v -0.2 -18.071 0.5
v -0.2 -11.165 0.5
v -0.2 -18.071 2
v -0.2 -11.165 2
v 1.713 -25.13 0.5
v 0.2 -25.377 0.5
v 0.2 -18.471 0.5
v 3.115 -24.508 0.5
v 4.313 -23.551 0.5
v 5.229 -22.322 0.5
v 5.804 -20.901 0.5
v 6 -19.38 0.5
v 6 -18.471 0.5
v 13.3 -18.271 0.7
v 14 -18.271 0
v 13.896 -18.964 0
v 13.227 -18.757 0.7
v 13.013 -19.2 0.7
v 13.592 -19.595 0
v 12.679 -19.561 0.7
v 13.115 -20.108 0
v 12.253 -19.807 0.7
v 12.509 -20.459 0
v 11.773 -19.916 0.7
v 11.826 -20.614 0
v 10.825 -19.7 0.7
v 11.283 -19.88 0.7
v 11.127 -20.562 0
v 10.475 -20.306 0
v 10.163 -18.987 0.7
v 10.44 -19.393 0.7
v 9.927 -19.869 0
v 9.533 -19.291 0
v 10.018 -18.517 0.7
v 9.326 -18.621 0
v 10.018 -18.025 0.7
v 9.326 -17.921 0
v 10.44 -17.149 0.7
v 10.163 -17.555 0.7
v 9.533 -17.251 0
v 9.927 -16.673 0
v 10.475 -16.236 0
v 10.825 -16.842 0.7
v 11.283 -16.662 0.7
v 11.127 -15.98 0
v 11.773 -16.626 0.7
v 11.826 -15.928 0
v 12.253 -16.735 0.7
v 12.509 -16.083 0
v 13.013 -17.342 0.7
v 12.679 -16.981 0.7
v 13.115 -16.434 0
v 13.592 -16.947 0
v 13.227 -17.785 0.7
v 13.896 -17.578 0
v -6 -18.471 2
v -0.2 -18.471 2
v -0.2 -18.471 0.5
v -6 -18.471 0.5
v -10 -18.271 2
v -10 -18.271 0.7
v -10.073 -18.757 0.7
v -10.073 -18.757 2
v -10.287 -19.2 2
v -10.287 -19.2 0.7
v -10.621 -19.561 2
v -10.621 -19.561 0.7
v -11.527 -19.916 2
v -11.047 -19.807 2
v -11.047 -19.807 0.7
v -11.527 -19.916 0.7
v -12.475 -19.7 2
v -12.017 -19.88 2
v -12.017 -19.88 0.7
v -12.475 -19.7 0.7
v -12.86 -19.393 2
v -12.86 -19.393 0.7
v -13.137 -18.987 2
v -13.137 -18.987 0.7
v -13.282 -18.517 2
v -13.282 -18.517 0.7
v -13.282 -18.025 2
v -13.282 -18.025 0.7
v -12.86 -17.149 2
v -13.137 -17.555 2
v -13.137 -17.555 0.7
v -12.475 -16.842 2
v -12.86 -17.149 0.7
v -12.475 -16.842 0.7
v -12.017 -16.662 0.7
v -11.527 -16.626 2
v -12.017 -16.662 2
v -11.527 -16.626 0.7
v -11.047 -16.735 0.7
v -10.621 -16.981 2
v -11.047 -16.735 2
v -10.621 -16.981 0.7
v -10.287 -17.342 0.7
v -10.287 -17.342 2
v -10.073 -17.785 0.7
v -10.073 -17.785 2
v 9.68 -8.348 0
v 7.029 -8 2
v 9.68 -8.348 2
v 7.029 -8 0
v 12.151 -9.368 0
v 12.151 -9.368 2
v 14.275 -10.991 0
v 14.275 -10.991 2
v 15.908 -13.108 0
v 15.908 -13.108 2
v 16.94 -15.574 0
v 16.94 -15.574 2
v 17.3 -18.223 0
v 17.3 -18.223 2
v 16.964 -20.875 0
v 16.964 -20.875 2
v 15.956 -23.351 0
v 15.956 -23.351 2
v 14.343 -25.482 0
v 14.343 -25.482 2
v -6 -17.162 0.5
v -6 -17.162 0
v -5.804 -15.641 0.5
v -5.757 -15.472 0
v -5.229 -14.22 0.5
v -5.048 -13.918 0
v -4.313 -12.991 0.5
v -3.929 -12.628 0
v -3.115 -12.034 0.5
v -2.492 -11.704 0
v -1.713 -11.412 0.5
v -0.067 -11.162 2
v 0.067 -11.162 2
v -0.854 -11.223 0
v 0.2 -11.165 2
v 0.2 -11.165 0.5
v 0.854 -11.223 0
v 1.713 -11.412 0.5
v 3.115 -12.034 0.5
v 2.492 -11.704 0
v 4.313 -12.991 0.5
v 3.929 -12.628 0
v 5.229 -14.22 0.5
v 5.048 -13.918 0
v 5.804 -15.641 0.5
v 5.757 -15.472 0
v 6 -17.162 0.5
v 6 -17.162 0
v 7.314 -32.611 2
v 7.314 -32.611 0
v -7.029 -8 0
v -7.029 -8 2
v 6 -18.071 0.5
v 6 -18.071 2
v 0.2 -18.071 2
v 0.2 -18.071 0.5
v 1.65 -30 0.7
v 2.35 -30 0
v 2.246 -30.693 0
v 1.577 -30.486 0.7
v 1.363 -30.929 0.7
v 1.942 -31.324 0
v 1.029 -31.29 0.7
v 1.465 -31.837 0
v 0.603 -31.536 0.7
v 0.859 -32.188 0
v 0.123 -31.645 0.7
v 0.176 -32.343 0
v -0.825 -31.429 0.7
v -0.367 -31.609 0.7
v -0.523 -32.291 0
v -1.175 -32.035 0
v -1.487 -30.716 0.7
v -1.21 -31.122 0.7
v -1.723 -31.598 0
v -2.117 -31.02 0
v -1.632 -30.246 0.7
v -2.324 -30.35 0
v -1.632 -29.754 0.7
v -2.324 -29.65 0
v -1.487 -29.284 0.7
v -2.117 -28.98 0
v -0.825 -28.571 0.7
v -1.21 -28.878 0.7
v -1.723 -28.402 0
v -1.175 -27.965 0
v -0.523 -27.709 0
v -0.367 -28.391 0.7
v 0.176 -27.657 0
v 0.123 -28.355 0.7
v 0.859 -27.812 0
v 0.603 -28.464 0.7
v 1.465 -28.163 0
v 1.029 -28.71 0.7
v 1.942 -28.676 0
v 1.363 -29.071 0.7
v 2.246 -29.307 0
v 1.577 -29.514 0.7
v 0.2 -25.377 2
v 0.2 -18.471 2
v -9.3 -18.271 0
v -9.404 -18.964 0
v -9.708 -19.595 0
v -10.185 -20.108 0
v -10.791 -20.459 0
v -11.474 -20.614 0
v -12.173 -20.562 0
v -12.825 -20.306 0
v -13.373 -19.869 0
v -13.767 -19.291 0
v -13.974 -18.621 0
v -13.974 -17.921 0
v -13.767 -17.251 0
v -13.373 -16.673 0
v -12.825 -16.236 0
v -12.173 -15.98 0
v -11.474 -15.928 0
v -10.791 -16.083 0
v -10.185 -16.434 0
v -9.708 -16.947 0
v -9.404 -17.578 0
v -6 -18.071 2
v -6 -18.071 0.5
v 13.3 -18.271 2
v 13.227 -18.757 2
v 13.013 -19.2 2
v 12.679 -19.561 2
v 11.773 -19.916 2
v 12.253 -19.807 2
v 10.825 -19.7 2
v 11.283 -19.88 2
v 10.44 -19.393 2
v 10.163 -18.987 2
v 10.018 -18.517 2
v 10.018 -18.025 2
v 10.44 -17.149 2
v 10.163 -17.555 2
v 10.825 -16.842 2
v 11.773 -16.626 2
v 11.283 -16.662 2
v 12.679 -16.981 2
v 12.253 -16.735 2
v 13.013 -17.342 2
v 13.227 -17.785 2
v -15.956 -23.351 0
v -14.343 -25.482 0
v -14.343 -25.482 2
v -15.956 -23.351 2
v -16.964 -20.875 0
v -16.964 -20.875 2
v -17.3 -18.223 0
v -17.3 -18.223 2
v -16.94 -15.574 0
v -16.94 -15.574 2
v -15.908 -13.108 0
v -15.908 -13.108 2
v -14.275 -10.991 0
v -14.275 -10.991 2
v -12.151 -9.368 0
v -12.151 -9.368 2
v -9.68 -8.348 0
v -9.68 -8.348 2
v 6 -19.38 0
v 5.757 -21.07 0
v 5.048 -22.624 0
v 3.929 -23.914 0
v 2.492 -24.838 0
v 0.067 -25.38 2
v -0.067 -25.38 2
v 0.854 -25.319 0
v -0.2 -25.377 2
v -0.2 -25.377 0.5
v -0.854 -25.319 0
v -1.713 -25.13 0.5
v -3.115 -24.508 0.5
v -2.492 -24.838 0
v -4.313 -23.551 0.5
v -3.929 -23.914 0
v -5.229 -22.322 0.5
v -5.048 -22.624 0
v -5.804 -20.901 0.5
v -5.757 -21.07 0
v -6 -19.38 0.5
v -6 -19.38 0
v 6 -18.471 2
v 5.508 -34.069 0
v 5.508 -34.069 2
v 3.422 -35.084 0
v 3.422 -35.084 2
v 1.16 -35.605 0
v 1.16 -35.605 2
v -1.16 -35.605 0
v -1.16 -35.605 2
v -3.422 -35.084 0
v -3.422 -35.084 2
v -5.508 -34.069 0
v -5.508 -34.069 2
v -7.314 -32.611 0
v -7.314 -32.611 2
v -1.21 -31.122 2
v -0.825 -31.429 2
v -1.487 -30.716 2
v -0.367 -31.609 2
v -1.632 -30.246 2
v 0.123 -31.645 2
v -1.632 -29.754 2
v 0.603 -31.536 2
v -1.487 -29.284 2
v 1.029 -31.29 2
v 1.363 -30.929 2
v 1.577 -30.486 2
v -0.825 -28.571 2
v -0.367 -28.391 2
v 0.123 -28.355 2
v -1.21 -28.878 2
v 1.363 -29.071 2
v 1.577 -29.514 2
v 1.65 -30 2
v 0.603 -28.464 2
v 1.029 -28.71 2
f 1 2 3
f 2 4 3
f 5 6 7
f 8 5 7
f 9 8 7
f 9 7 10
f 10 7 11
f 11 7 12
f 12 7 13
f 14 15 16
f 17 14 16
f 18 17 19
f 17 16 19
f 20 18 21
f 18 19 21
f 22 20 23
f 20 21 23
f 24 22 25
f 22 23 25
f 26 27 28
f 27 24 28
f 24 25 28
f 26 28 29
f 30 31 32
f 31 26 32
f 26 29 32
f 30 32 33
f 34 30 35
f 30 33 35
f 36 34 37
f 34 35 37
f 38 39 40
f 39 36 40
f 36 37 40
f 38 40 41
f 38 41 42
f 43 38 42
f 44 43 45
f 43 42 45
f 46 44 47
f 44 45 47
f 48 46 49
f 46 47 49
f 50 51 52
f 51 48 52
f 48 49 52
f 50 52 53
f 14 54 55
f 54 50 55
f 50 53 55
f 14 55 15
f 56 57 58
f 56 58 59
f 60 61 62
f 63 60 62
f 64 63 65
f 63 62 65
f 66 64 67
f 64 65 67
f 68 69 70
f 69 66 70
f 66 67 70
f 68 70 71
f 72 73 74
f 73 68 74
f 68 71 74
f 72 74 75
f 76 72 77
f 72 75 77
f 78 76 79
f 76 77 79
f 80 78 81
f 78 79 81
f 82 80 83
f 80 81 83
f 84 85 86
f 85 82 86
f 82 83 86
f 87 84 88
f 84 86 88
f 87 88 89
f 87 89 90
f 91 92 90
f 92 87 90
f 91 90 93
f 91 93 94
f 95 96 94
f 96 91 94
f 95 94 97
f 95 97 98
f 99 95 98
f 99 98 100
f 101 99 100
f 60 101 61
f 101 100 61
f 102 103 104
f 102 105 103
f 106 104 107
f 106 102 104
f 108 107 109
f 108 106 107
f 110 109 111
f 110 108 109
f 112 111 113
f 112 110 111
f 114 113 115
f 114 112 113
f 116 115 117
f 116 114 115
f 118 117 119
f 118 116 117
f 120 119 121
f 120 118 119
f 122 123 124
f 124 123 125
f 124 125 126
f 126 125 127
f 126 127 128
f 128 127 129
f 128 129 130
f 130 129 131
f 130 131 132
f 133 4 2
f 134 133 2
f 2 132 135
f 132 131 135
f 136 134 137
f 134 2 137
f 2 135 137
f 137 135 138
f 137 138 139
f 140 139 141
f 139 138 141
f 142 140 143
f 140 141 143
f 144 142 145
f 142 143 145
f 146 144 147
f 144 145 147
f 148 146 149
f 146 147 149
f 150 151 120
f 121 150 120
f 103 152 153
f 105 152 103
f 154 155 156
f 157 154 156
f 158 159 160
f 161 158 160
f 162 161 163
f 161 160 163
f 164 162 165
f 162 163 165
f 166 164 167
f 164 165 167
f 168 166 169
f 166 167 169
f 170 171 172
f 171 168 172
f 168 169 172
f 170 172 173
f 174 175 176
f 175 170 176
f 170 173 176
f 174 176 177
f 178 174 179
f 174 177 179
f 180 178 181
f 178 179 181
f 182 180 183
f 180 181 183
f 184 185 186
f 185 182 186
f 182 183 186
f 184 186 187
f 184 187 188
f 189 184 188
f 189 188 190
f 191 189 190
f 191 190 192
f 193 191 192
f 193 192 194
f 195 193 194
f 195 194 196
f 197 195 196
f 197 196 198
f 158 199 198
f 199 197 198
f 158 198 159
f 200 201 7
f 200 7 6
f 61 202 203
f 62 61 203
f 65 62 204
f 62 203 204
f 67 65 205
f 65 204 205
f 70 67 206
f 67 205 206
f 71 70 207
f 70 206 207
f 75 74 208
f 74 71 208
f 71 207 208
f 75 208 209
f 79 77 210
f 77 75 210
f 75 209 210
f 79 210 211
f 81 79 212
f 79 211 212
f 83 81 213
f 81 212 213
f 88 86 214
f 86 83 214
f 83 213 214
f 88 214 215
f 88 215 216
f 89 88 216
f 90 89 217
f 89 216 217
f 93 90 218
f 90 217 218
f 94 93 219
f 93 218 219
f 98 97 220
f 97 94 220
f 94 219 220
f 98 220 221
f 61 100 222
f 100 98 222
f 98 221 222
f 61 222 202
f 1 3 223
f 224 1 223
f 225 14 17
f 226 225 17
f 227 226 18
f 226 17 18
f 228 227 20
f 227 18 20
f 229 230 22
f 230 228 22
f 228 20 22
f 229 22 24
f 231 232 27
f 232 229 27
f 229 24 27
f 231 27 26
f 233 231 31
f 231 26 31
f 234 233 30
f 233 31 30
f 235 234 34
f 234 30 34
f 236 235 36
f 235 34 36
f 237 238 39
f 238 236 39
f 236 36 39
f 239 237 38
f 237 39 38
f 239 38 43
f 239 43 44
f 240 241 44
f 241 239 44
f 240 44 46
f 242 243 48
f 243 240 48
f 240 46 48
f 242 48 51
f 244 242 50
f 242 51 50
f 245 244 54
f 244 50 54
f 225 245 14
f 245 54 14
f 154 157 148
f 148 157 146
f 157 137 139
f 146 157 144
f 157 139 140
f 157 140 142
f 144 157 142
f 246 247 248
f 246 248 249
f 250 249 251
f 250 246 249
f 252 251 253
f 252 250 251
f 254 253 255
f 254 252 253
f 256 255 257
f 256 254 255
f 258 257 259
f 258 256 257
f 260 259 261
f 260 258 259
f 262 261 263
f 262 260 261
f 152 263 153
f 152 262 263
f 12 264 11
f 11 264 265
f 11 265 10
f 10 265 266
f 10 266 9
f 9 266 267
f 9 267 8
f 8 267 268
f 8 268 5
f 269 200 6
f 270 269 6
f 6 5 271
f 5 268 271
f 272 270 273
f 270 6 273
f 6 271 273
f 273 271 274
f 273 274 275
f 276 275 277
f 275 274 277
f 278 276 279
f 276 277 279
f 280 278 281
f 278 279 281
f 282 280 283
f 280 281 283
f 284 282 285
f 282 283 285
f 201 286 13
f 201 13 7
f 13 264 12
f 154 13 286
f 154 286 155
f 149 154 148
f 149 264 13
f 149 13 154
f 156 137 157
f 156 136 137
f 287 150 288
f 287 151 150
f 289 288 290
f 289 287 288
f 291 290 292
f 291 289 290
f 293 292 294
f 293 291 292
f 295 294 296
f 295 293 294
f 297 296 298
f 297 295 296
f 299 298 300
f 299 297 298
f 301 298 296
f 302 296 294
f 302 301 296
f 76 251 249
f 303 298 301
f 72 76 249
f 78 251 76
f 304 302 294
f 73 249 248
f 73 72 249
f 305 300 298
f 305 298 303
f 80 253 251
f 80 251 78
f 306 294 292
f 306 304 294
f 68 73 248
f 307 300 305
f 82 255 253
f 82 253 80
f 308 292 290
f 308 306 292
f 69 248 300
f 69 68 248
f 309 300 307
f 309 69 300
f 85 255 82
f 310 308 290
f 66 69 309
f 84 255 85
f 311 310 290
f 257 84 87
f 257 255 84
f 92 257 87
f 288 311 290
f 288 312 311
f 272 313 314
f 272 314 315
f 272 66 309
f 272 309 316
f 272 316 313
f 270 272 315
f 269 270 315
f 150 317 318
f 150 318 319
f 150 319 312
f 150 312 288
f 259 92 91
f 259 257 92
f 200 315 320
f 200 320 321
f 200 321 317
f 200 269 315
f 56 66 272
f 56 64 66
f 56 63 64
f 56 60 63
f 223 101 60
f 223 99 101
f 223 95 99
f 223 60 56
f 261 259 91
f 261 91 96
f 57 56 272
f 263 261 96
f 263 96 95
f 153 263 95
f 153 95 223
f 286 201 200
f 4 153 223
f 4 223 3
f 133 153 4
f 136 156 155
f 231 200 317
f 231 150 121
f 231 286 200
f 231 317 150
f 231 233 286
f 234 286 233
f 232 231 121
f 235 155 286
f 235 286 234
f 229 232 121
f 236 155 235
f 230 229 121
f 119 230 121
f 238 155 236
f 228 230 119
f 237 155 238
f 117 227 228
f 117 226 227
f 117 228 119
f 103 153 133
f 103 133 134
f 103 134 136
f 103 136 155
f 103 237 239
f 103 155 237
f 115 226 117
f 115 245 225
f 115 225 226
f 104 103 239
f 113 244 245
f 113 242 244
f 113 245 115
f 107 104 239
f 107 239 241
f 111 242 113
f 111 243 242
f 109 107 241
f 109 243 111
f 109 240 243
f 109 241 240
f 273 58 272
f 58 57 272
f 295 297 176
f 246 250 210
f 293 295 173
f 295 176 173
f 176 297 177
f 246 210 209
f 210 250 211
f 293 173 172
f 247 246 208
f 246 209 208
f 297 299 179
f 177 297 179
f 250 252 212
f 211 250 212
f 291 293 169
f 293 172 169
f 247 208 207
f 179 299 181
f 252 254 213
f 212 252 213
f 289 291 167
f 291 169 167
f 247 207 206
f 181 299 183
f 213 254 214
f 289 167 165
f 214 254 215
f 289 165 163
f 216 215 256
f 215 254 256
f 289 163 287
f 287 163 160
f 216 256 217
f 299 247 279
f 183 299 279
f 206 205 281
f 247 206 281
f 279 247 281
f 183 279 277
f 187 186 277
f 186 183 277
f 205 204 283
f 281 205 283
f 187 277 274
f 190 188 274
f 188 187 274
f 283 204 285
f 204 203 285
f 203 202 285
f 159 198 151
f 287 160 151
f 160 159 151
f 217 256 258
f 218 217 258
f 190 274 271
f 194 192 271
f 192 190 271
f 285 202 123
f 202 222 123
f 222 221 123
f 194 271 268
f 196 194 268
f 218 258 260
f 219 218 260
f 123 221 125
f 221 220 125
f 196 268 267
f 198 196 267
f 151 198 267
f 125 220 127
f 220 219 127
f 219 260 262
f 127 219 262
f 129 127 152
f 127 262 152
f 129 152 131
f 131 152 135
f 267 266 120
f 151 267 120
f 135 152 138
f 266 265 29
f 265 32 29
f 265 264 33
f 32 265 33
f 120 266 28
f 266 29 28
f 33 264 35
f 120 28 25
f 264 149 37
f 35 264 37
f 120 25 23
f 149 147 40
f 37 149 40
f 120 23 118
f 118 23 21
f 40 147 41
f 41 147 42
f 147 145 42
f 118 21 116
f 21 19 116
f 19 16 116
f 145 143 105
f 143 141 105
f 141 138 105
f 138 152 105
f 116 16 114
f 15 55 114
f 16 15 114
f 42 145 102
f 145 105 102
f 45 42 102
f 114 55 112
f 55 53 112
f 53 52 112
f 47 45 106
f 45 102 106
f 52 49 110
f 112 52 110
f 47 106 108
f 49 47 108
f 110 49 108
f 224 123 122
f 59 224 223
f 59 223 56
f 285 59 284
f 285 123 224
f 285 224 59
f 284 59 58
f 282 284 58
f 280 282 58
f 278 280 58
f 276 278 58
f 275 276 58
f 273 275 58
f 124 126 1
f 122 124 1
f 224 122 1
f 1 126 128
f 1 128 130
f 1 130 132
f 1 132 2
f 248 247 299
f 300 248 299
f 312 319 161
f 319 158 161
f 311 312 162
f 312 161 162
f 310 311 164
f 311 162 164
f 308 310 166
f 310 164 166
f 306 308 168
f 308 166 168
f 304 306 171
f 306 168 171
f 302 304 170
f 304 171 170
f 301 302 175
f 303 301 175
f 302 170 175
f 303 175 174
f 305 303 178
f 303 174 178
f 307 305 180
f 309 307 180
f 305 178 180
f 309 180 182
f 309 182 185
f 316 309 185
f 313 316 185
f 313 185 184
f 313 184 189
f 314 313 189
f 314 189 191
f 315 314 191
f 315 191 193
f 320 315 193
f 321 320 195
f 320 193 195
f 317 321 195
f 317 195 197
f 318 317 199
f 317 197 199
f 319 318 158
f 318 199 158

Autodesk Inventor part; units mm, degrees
ref_plane "YZ Plane" through (0, 0, 0) normal (1, 0, 0) x (0, 1, 0)
ref_plane "XZ Plane" through (0, 0, 0) normal (0, 1, 0) x (-1, 0, 0)
ref_plane "XY Plane" through (0, 0, 0) normal (0, 0, 1) x (1, 0, 0)
sketch "Sketch1" plane through (0, 0, 0) normal (0, 0, 1) x (1, 0, 0)
  circle A0 centre (0, 0) radius 6.5 construction
  ellipse E0 centre (0, -17.162) end of major axis (0, -11.841) minor radius 5 construction
  line L0 (0, -44.4052) -> (0, 16.7342) projected
  ellipse E1 centre (0, -19.38) end of major axis (0, -14.059) minor radius 5 construction
  line L1 (0, -17.162) -> (0, -19.38) construction
  line L2 (-6, -17.162) -> (-6, -19.38)
  line L3 (6, -19.38) -> (6, -17.162)
  arc A1 (6, -17.162) -> (-6, -17.162) centre (0, -17.162) ccw
  arc A2 (-6, -19.38) -> (6, -19.38) centre (0, -19.38) ccw
  circle A3 centre (0, 0) radius 8 construction
  circle A4 centre (11.65, -18.271) radius 1.65
  line L4 (11.65, -18.271) -> (6, -18.271) construction
  circle A5 centre (-11.65, -18.271) radius 1.65
  line L5 (7.029, -18.271) -> (-7.029, -18.271) construction
  line L6 (7.029, -28.542) -> (-7.029, -28.542)
  line L7 (-7.029, -8) -> (7.029, -8)
  arc A6 (7.029, -28.542) -> (7.029, -8) centre (7.029, -18.271) ccw
  arc A7 (-7.029, -8) -> (-7.029, -28.542) centre (-7.029, -18.271) ccw
  circle A8 centre (0, -30) radius 1.65
  circle A9 centre (0, -25.4) radius 10.271
  line L8 (-14.3428, -25.4822) -> (-7.3138, -32.6112)
  line L9 (7.3138, -32.6112) -> (14.3428, -25.4822)
  line L10 (11.65, -18.271) -> (0, 0) construction
  point P0 (0, -18.271)
  point P1 (0, -8)
  point P2 (-0.7725, -28.542)
  point P3 (0.7725, -28.542)
  dimension "d7" = 5
  dimension "d8" = 5.321
  dimension "d10" = 5.321
  dimension "d11" = 5
  dimension "d0" = 13
  dimension "d9" = 17.162
  dimension "d12" = 2.218
  dimension "d13" = 12
  dimension "d14" = 1.5
  dimension "d15" = 3.3
  dimension "d16" = 4
  dimension "d17" = 4
  dimension "d18" = 3.3
  dimension "d19" = 4
  dimension "d50" = 3.3
  dimension "d51" = 30
  dimension "d52" = 4.6
  dimension "d54" = 21.6691
  dimension "d55" = 32.523
extrude "Extrusion3" add sketch "Sketch1" along normal blind 2 contours A9 A7 L6 A8 L0 | L0 A8 L6 A6 A9 | L8 A7 A9 | A9 A6 L9 | L6 A7 A9 A1 L2 A2 L0 A8 | A7 L7 L0 A1 A9 | A9 A1 L0 L7 A6 | A6 L6 A8 L0 A2 L3 A1 A9
sketch "Sketch4" plane through (0, 0, 2) normal (0, 0, 1) x (1, 0, 0)
  line L0 (6, -17.162) -> (6, -19.38) projected
  line L1 (6, -18.471) -> (-6, -18.471)
  line L2 (6, -18.071) -> (-6, -18.071)
  line L3 (6, -18.271) -> (-6, -18.271) construction
  line L4 (-6, -19.38) -> (-6, -17.162) construction
  line L5 (0.2, -11.1653) -> (0.2, -25.3767)
  arc A0 (6, -17.162) -> (-6, -17.162) centre (0, -17.162) ccw projected
  line L6 (-0.2, -11.1653) -> (-0.2, -25.3767)
  line L7 (0, -42.8052) -> (0, 7.1342) projected
  arc A1 (-6, -19.38) -> (6, -19.38) centre (0, -19.38) ccw projected
  arc A2 (-7.029, -8) -> (-14.3428, -25.4822) centre (-7.029, -18.271) ccw projected
  arc A3 (14.3428, -25.4822) -> (7.029, -8) centre (7.029, -18.271) ccw projected
  line L8 (7.029, -8) -> (-7.029, -8) projected
  arc A4 (6, -17.162) -> (-6, -17.162) centre (0, -17.162) ccw projected
  line L9 (6, -17.162) -> (6, -19.38) projected
  arc A5 (-6, -19.38) -> (6, -19.38) centre (0, -19.38) ccw projected
  line L10 (-6, -19.38) -> (-6, -17.162) projected
  circle A6 centre (-11.65, -18.271) radius 1.65 projected
  circle A7 centre (11.65, -18.271) radius 1.65 projected
  line L11 (-14.3428, -25.4822) -> (-7.3138, -32.6112) projected
  arc A8 (-7.3138, -32.6112) -> (7.3138, -32.6112) centre (0, -25.4) ccw projected
  line L12 (7.3138, -32.6112) -> (14.3428, -25.4822) projected
  point P0 (0, 0)
  point P1 (-6, -18.471)
  point P2 (-0.2, -18.471)
  point P3 (0.2, -18.471)
  point P4 (0.2, -18.071)
  point P5 (-6, -18.071)
  point P6 (-0.2, -18.071)
  dimension "d22" = 0.4
  dimension "d23" = 0.4
extrude "Extrusion4" add sketch "Sketch4" against normal blind 1.5 contours L0 L2 L5 A0 | L0 A1 L5 L1 | L6 L2 L10 A0 | L6 A1 L10 L1
chamfer "Chamfer1" distance 0.7 angle 45 5 edges at (10, -18.271, 0) (-13.3, -18.271, 0) (-0.8509, -31.4137, 0) (0, -28.35, 0) (1.4137, -29.1491, 0)
sketch "Sketch5" plane through (0, 0, 0) normal (0, 0, -1) x (-1, 0, 0)
  line L0 (-19.5, -6.271) -> (19.5, -6.271)
  line L1 (19.5, -6.271) -> (19.5, -30.271)
  line L2 (19.5, -30.271) -> (-19.5, -30.271)
  line L3 (-19.5, -30.271) -> (-19.5, -6.271)
  line L4 (-19.5, -6.271) -> (19.5, -30.271) construction
  line L5 (19.5, -6.271) -> (-19.5, -30.271) construction
  line L6 (7.029, -28.542) -> (-7.029, -28.542) projected
  line L7 (-7.029, -8) -> (7.029, -8) projected
  arc A0 (14.3428, -25.4822) -> (7.029, -8) centre (7.029, -18.271) ccw projected
  line L8 (0, -42.8052) -> (0, 7.1342) projected
  line L9 (6, -18.471) -> (0.2, -18.471) construction
  line L10 (-0.2, -18.071) -> (0.2, -18.471) construction
  line L11 (-0.2, -25.3767) -> (-0.2, -18.471) construction
  line L12 (-0.2, -18.471) -> (0.2, -18.071) construction
  line L13 (19.5, -30.271) -> (15.6547, -34.171)
  line L14 (15.6547, -34.171) -> (-15.6547, -34.171)
  line L15 (-15.6547, -34.171) -> (-19.5, -30.271)
  line L16 (-7.3138, -32.6112) -> (-14.3428, -25.4822) projected
  line L17 (14.3428, -25.4822) -> (7.3138, -32.6112) projected
  arc A1 (-7.3138, -32.6112) -> (7.3138, -32.6112) centre (0, -25.4) ccw projected
  point P0 (0, 0)
  point P1 (0, -18.271)
  point P2 (0, -18.271)
  point P3 (0, -18.271)
  dimension "d36" = 24
  dimension "d37" = 39
  dimension "d53" = 1.5
sketch "Sketch8" plane through (0, 0, 2) normal (0, 0, 1) x (1, 0, 0)
  line L0 (-0.2, -11.1653) -> (-0.2, -18.071) projected
  line L1 (-0.2, -18.071) -> (-6, -18.071) projected
  line L2 (-6, -18.071) -> (-6, -18.471) projected
  line L3 (-6, -18.471) -> (-0.2, -18.471) projected
  line L4 (-0.2, -18.471) -> (-0.2, -25.3767) projected
  arc A0 (-0.2, -25.3767) -> (0.2, -25.3767) centre (0, -19.38) ccw projected
  line L5 (0.2, -25.3767) -> (0.2, -18.471) projected
  line L6 (0.2, -18.471) -> (6, -18.471) projected
  line L7 (6, -18.471) -> (6, -18.071) projected
  line L8 (6, -18.071) -> (0.2, -18.071) projected
  line L9 (0.2, -18.071) -> (0.2, -11.1653) projected
  arc A1 (0.2, -11.1653) -> (-0.2, -11.1653) centre (0, -17.162) ccw projected
  line L10 (0.2, -18.471) -> (0.2, -25.3767)
  arc A2 (-0.2, -25.3767) -> (0.2, -25.3767) centre (0, -19.38) ccw
  line L11 (-0.2, -25.3767) -> (-0.2, -18.471)
  line L12 (-0.2, -18.471) -> (-6, -18.471)
  line L13 (-6, -18.471) -> (-6, -18.071)
  line L14 (-6, -18.071) -> (-0.2, -18.071)
  line L15 (-0.2, -18.071) -> (-0.2, -11.1653)
  arc A3 (0.2, -11.1653) -> (-0.2, -11.1653) centre (0, -17.162) ccw
  line L16 (0.2, -11.1653) -> (0.2, -18.071)
  line L17 (0.2, -18.071) -> (6, -18.071)
  line L18 (6, -18.071) -> (6, -18.471)
  line L19 (6, -18.471) -> (0.2, -18.471)
  line L20 (-0.2, -11.1653) -> (-0.2, -11.1653)
  arc A4 (0.2, -11.1653) -> (-0.2, -11.1653) centre (0, -17.162) ccw projected
  line L21 (0.2, -11.1653) -> (0.2, -11.1653)
  line L22 (0.2, -25.3767) -> (0.2, -25.3767)
  line L23 (-0.2, -25.3767) -> (-0.2, -25.3767)
  line L24 (-6, -18.471) -> (-6, -18.471)
  line L25 (-6, -18.071) -> (-6, -18.471) projected
  line L26 (-6, -18.071) -> (-6, -18.071)
  line L27 (6, -18.071) -> (6, -18.071)
  line L28 (6, -18.471) -> (6, -18.471)
  point P0 (0, 0)
  dimension "d47" = 0.4
sketch "Sketch6" plane through (-6, 6.479, 2) normal (0, 0, 1) x (1, 0, 0)
  line L0 (5.25, 6.3119) -> (5.25, 0) projected
  line L1 (5.25, 0) -> (0, 0) projected
  line L2 (0, 0) -> (0, -1.5) projected
  line L3 (0, -1.5) -> (5.25, -1.5) projected
  line L4 (5.25, -1.5) -> (5.25, -7.8119) projected
  arc A0 (5.25, -7.8119) -> (6.75, -7.8119) centre (6, -1.859) ccw projected
  line L5 (6.75, -7.8119) -> (6.75, -1.5) projected
  line L6 (6.75, -1.5) -> (12, -1.5) projected
  line L7 (12, -1.5) -> (12, 0) projected
  line L8 (12, 0) -> (6.75, 0) projected
  line L9 (6.75, 0) -> (6.75, 6.3119) projected
  arc A1 (6.75, 6.3119) -> (5.25, 6.3119) centre (6, 0.359) ccw projected
  line L10 (6.5, -0.25) -> (11.75, -0.25)
  line L11 (11.75, -0.25) -> (11.75, -1.25)
  line L12 (11.75, -1.25) -> (6.5, -1.25)
  line L13 (6.5, -1.25) -> (6.5, -7.5872)
  arc A2 (5.5, -7.5872) -> (6.5, -7.5872) centre (6, -1.859) ccw
  line L14 (5.5, -7.5872) -> (5.5, -1.25)
  line L15 (5.5, -1.25) -> (0.25, -1.25)
  line L16 (0.25, -1.25) -> (0.25, -0.25)
  line L17 (0.25, -0.25) -> (5.5, -0.25)
  line L18 (5.5, -0.25) -> (5.5, 6.0872)
  arc A3 (6.5, 6.0872) -> (5.5, 6.0872) centre (6, 0.359) ccw
  line L19 (6.5, 6.0872) -> (6.5, -0.25)
  point P0 (6, -6.479)
  dimension "d41" = 0.25
sketch "Sketch7" plane through (0, 0, 2) normal (0, 0, 1) x (1, 0, 0)
  line L0 (18.2501, 17.0189) -> (18.2501, 11.7049) construction
  line L1 (18.2501, 11.7049) -> (11.9326, 11.7049) construction
  line L2 (11.9326, 11.7049) -> (11.9326, 17.0189) construction
  line L3 (11.9326, 17.0189) -> (18.2501, 17.0189) construction
  line L4 (-15.246, -25.6115) -> (-15.246, -29.9114) construction
  line L5 (-15.246, -29.9114) -> (-18.746, -29.9114) construction
  line L6 (-18.746, -29.9114) -> (-18.746, -25.6115) construction
  line L7 (-18.746, -25.6115) -> (-15.246, -25.6115) construction
  point P0 (0, 0)
equation "\"d10\" = d8"
equation "\"d11\" = d7"
equation "\"d17\" = d16"
equation "\"d18\" = d15"
equation "\"d50\" = d15"
equation "\"d23\" = d22"
properties part number "Cover" material "Rubber"
